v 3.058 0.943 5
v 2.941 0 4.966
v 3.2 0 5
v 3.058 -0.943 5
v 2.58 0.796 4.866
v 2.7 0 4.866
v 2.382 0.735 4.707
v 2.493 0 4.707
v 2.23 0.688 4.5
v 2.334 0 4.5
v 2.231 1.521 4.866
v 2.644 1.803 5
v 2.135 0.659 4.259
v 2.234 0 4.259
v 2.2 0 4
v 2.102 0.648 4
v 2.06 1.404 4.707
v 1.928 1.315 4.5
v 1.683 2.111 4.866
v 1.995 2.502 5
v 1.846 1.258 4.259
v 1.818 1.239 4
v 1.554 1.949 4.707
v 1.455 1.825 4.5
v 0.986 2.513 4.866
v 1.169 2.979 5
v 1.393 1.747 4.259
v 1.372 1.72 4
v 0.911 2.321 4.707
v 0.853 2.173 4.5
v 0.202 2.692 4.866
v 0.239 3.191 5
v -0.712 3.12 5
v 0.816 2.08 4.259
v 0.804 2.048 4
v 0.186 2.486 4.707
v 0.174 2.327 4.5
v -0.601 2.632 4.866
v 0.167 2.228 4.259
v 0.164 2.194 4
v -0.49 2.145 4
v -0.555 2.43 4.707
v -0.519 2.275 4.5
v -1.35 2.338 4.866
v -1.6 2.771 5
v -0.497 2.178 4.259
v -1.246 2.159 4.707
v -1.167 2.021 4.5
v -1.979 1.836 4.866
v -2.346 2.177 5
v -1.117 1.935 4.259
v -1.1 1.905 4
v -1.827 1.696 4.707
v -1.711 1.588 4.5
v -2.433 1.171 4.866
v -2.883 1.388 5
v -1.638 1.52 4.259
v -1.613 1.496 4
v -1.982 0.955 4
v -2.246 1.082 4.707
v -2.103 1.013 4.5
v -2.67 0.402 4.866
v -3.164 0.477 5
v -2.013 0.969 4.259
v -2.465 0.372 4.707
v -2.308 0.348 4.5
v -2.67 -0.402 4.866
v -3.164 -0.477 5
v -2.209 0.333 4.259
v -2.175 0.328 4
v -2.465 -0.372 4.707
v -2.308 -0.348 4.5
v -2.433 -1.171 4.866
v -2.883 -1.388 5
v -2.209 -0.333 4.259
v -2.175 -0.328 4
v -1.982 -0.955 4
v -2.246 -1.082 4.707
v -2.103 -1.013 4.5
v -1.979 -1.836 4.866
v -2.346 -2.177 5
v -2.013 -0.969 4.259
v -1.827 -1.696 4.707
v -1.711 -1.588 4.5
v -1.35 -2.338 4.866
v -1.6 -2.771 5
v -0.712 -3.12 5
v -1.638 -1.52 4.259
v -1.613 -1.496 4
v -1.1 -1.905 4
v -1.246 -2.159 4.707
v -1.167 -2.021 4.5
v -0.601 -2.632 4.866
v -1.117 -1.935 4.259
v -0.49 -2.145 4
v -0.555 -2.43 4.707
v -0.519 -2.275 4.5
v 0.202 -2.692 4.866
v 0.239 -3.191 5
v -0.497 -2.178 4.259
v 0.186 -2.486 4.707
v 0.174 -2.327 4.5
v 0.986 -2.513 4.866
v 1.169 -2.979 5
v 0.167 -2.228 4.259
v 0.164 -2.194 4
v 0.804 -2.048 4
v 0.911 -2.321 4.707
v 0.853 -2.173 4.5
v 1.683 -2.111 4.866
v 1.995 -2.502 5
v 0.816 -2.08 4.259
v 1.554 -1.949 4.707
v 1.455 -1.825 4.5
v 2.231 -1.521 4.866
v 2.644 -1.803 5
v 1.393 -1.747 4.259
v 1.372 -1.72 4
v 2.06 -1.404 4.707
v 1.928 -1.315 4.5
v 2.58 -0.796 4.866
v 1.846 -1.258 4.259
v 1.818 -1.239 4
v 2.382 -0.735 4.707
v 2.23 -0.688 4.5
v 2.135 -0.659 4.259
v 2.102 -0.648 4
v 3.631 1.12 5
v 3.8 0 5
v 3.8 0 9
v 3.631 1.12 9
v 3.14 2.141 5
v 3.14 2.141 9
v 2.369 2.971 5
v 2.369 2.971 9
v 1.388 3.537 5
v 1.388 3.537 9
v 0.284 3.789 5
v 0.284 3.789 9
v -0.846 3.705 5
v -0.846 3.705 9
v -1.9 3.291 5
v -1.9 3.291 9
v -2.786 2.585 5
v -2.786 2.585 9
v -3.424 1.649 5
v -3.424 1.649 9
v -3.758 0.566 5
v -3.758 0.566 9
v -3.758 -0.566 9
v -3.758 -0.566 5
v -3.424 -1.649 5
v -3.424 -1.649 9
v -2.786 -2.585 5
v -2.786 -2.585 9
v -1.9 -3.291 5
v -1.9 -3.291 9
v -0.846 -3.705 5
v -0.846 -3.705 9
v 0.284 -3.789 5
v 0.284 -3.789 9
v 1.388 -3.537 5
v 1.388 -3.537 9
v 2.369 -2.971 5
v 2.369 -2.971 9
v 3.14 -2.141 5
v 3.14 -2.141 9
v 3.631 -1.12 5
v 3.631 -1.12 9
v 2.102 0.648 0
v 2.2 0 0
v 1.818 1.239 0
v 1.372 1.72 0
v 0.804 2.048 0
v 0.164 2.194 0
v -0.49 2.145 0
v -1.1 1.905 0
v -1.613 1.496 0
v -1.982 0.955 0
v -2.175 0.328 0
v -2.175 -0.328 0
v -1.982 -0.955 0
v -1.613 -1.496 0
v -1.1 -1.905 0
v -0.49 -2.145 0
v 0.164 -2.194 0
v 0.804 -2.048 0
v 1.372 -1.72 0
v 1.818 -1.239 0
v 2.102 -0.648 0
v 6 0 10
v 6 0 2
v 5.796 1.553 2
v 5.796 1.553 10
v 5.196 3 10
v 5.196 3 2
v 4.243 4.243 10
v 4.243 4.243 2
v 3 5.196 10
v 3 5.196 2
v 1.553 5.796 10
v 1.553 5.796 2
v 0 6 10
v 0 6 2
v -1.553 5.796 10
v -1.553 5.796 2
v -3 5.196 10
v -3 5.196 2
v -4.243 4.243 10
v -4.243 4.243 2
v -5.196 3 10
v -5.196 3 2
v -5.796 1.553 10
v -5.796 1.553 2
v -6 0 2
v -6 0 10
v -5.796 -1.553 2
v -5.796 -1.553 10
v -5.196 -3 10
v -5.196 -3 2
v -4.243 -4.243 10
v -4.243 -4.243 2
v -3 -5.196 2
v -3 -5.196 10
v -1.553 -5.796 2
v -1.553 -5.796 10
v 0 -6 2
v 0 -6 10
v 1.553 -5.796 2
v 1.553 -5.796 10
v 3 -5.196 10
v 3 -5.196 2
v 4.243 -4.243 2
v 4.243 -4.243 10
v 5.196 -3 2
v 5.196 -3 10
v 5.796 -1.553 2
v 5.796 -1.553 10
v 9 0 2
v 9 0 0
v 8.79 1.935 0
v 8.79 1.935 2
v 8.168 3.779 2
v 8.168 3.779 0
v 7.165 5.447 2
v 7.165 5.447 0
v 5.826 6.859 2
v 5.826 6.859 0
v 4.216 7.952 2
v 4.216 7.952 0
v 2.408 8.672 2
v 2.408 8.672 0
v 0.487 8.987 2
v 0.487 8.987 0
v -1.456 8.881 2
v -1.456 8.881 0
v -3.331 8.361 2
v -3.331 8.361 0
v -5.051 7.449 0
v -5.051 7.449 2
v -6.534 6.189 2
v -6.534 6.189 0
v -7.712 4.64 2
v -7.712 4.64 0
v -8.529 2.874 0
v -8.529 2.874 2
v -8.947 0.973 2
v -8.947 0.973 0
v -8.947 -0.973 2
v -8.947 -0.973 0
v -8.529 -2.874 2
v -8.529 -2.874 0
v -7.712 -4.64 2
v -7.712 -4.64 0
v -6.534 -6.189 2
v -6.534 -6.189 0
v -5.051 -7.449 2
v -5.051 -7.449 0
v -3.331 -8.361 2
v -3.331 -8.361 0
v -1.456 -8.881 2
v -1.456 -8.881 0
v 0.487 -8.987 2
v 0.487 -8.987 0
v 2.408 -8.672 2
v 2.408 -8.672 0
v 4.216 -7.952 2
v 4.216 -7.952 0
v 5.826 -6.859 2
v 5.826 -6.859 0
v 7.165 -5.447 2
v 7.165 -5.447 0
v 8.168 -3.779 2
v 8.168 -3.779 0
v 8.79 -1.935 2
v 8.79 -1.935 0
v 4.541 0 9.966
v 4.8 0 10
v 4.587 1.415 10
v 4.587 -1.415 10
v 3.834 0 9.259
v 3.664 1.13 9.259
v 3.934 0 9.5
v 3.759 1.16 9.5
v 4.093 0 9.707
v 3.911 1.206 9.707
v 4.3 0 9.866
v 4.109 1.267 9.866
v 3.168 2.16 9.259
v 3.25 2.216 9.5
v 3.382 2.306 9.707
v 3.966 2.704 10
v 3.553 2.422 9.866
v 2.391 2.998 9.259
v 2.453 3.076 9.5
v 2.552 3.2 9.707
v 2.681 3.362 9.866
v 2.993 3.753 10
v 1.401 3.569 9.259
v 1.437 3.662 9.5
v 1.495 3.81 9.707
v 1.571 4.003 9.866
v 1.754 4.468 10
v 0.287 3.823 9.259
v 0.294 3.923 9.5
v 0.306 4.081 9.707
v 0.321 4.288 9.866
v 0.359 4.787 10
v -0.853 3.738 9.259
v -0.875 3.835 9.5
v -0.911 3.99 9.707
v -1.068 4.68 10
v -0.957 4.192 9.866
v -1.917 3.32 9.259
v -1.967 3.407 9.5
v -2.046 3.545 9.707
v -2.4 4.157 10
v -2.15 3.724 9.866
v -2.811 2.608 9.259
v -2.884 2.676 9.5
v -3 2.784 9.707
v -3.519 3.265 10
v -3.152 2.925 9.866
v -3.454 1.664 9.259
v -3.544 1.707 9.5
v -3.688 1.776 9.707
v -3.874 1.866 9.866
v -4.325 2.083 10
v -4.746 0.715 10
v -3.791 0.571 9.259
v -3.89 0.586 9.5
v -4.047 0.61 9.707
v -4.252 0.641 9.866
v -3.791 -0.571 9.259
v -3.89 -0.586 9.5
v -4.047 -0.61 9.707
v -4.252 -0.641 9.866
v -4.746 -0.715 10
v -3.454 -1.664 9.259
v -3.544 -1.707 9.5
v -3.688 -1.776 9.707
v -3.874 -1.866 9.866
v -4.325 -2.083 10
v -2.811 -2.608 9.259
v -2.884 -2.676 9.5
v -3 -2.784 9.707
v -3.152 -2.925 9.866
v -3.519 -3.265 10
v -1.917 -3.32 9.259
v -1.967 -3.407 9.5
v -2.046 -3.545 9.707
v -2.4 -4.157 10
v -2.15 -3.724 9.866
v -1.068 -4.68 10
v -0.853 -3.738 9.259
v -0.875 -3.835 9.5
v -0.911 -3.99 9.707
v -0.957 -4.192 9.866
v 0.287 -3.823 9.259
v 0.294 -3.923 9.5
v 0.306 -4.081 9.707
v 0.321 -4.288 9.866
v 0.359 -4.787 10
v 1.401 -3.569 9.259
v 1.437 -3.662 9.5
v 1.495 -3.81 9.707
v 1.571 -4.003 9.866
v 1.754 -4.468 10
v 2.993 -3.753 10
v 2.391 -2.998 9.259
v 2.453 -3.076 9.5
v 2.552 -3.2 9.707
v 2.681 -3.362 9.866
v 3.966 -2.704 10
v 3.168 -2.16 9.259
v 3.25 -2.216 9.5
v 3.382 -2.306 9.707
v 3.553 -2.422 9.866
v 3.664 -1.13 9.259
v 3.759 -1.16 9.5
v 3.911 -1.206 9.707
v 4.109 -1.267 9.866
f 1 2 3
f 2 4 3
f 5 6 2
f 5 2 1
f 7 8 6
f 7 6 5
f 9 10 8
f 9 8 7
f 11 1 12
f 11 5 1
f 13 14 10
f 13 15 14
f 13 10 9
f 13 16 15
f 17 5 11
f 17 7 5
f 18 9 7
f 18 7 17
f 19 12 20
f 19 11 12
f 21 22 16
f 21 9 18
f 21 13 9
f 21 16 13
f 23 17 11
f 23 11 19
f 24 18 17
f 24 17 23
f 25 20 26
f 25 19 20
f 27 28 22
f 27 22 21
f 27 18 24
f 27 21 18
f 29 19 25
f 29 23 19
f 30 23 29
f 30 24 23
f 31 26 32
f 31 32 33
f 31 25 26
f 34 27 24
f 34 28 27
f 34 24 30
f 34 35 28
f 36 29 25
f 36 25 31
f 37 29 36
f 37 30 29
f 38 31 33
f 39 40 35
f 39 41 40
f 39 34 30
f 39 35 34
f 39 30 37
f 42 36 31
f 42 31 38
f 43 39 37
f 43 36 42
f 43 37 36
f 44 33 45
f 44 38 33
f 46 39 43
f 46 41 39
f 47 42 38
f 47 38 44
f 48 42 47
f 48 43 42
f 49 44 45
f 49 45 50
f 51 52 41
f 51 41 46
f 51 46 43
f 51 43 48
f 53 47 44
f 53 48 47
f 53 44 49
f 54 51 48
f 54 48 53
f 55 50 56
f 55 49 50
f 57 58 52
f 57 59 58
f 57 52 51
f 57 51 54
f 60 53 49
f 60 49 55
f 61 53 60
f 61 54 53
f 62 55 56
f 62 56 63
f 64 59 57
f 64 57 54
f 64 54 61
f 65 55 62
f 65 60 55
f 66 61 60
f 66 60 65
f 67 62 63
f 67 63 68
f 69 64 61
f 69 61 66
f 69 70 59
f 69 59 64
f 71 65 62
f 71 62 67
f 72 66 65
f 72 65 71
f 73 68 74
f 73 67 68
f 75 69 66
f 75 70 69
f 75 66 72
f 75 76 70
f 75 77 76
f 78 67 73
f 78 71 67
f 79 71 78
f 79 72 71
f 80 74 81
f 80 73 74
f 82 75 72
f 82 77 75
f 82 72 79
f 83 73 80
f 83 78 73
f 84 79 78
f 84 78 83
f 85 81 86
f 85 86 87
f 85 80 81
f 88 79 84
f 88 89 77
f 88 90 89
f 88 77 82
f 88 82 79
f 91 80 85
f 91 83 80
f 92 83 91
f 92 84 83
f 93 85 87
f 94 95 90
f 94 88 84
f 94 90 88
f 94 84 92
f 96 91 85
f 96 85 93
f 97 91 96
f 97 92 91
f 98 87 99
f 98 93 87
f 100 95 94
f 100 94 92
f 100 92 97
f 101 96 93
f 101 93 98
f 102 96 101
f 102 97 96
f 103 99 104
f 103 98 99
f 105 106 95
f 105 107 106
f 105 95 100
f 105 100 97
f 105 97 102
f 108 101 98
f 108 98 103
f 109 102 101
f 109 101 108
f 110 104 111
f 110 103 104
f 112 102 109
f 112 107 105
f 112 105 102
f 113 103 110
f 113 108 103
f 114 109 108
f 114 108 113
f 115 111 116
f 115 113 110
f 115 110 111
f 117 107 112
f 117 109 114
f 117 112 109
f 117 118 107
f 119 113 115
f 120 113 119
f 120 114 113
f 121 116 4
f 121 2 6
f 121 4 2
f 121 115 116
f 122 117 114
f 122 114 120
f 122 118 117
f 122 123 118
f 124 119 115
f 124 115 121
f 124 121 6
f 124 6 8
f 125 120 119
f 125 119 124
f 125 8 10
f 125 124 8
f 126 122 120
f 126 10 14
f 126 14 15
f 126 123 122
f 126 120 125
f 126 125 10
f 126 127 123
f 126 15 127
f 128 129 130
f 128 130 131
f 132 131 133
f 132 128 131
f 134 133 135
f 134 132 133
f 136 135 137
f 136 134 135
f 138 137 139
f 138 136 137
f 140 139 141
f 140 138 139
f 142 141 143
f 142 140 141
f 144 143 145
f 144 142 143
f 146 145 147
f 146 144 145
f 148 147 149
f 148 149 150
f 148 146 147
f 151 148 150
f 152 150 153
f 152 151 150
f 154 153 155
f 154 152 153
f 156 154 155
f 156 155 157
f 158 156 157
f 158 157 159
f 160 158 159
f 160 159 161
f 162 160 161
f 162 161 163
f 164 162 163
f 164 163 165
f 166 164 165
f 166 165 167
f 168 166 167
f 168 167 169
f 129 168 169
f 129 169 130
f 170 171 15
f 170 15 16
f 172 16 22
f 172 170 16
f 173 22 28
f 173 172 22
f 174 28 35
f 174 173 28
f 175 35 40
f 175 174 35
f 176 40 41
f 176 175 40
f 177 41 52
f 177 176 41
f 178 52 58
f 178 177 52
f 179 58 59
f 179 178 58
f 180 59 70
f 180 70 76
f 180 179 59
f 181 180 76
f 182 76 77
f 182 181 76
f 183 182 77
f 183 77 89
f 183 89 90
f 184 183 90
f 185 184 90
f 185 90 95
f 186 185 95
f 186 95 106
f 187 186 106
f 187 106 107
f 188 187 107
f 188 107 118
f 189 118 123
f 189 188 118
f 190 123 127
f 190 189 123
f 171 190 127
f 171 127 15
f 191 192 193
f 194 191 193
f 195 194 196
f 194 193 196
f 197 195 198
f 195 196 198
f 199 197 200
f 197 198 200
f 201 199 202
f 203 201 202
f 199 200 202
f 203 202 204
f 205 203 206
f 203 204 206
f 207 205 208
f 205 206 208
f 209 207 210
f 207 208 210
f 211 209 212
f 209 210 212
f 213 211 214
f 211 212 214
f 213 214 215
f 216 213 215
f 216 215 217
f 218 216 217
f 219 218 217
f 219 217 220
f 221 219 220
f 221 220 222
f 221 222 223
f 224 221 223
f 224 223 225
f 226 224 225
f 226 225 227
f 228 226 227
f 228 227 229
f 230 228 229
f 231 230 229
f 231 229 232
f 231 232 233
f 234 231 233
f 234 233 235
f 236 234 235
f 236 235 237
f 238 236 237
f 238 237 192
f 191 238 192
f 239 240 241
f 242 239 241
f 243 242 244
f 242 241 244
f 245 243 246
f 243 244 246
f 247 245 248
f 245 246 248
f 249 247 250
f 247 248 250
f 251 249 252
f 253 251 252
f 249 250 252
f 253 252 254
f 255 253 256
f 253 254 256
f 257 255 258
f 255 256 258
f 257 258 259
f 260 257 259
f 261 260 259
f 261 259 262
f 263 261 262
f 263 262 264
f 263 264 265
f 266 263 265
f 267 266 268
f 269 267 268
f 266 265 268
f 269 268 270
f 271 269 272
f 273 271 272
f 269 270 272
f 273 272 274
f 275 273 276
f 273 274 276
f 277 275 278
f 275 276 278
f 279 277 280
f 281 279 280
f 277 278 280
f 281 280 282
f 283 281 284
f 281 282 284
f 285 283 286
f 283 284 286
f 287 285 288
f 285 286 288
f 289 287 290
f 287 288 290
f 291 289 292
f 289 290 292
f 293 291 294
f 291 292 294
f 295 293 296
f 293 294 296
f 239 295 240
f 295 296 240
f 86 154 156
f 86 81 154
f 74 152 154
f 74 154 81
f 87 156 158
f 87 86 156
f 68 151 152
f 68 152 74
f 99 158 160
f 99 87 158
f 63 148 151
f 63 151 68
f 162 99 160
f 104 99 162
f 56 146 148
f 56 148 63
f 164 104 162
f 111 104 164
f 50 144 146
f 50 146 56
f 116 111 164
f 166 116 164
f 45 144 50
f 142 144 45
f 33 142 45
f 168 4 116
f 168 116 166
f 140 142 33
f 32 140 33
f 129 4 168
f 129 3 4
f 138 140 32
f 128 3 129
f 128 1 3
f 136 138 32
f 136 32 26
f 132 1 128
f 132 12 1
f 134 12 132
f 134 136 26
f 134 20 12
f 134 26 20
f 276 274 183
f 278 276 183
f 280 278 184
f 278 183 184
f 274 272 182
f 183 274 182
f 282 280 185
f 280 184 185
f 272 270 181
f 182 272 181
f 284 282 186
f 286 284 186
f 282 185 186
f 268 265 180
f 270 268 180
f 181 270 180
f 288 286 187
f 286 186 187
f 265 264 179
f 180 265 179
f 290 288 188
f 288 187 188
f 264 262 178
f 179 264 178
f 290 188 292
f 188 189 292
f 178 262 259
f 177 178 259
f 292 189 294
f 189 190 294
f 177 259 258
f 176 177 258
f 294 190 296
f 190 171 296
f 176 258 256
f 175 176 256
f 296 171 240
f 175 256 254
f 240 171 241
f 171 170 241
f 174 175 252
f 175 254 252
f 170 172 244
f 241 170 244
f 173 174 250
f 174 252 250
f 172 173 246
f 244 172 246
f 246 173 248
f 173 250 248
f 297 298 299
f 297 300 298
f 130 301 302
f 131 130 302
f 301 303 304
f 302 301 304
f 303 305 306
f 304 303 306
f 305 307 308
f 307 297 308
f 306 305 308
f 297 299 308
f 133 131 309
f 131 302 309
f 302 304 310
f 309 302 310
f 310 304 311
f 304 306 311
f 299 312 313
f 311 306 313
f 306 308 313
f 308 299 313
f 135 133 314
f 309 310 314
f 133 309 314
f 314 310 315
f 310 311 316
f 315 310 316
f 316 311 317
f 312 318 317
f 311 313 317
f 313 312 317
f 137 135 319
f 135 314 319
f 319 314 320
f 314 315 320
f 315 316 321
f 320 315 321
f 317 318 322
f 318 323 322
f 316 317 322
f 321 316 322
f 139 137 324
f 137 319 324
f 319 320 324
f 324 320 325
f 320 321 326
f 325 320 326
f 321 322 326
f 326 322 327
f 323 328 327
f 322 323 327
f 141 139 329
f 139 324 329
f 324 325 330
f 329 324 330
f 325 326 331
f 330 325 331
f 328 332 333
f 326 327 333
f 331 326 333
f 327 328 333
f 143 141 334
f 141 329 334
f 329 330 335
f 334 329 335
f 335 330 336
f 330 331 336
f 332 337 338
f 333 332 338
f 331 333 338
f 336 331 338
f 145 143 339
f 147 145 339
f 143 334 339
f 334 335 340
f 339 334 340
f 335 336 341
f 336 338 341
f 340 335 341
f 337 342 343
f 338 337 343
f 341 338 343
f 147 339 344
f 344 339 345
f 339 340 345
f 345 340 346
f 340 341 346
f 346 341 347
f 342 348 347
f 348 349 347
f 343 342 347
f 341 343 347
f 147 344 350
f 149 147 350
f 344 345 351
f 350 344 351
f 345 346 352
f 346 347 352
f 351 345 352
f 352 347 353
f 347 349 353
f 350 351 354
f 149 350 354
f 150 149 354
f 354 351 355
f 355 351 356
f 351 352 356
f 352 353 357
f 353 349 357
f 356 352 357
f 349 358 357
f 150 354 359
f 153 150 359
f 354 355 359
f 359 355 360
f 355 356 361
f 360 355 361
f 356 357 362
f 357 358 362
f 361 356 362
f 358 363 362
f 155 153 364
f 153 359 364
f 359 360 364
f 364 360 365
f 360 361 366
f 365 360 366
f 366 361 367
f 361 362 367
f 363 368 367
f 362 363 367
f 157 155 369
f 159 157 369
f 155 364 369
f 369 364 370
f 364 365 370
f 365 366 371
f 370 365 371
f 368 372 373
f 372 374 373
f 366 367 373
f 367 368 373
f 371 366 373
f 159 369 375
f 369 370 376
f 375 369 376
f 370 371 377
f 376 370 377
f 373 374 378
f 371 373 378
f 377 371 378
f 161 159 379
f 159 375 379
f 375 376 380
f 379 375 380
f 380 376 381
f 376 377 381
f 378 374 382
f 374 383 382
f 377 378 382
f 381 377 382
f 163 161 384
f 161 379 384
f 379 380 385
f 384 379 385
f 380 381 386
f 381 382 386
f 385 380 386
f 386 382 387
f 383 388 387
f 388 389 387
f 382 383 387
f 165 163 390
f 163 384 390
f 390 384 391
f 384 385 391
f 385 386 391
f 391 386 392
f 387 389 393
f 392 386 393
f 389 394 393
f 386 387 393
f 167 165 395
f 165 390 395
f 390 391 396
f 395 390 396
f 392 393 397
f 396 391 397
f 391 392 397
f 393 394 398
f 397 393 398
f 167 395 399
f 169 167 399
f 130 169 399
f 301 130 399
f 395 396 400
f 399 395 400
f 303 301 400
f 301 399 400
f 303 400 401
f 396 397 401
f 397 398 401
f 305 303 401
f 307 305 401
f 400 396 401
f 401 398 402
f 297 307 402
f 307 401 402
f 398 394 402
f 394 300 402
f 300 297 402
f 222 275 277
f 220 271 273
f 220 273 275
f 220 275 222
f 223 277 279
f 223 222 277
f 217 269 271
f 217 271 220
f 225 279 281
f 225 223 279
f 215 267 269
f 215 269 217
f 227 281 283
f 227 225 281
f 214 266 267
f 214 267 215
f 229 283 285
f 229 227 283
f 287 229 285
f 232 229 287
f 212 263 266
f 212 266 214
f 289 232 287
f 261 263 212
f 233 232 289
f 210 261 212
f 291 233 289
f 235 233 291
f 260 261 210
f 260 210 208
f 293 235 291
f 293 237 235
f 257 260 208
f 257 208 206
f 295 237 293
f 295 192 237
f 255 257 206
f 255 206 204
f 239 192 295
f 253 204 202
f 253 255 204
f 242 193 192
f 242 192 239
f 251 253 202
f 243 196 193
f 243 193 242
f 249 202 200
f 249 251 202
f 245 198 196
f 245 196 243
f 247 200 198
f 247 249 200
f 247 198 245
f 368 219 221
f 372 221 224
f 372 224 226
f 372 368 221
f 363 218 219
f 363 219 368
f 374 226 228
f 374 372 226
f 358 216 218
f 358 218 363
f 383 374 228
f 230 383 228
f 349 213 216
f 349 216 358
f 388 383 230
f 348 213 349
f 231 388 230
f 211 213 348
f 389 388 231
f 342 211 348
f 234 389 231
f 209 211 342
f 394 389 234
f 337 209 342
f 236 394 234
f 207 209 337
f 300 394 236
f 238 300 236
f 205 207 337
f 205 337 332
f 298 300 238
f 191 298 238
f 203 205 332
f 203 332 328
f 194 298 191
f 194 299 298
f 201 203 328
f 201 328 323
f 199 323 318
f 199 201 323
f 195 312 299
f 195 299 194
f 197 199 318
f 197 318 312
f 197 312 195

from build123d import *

# Parameters (mm, degrees)
F0_R     = 9
F0_R_2   = 6
F1_DEPTH = 2
F0_R_3   = 3.8
F2_DEPTH = 10
F0_R_4   = 2.2
F3_DEPTH = 5
F4_R     = 1
F5_R     = 1


with BuildPart() as f1:
    # F0 (on Top) → F1 (new body)
    with BuildSketch(Plane.XY):
        Circle(F0_R)
        Circle(F0_R_2, mode=Mode.SUBTRACT)
    extrude(amount=F1_DEPTH)

    # F0 (on Top) → F2 (join)
    with BuildSketch(Plane.XY):
        Circle(F0_R_2)
        Circle(F0_R_3, mode=Mode.SUBTRACT)
    extrude(amount=F2_DEPTH)

    # F0 (on Top) → F3 (join)
    with BuildSketch(Plane.XY):
        Circle(F0_R_3)
        Circle(F0_R_4, mode=Mode.SUBTRACT)
    extrude(amount=F3_DEPTH)

    # F4
    f4_edges = [f1.edges().sort_by_distance(p)[0] for p in [
        (-3.8, 0, 10),
    ]]
    fillet(f4_edges, radius=F4_R)

    # F5
    f5_edges = [f1.edges().sort_by_distance(p)[0] for p in [
        (-2.2, 0, 5),
    ]]
    fillet(f5_edges, radius=F5_R)


solid = f1.part
